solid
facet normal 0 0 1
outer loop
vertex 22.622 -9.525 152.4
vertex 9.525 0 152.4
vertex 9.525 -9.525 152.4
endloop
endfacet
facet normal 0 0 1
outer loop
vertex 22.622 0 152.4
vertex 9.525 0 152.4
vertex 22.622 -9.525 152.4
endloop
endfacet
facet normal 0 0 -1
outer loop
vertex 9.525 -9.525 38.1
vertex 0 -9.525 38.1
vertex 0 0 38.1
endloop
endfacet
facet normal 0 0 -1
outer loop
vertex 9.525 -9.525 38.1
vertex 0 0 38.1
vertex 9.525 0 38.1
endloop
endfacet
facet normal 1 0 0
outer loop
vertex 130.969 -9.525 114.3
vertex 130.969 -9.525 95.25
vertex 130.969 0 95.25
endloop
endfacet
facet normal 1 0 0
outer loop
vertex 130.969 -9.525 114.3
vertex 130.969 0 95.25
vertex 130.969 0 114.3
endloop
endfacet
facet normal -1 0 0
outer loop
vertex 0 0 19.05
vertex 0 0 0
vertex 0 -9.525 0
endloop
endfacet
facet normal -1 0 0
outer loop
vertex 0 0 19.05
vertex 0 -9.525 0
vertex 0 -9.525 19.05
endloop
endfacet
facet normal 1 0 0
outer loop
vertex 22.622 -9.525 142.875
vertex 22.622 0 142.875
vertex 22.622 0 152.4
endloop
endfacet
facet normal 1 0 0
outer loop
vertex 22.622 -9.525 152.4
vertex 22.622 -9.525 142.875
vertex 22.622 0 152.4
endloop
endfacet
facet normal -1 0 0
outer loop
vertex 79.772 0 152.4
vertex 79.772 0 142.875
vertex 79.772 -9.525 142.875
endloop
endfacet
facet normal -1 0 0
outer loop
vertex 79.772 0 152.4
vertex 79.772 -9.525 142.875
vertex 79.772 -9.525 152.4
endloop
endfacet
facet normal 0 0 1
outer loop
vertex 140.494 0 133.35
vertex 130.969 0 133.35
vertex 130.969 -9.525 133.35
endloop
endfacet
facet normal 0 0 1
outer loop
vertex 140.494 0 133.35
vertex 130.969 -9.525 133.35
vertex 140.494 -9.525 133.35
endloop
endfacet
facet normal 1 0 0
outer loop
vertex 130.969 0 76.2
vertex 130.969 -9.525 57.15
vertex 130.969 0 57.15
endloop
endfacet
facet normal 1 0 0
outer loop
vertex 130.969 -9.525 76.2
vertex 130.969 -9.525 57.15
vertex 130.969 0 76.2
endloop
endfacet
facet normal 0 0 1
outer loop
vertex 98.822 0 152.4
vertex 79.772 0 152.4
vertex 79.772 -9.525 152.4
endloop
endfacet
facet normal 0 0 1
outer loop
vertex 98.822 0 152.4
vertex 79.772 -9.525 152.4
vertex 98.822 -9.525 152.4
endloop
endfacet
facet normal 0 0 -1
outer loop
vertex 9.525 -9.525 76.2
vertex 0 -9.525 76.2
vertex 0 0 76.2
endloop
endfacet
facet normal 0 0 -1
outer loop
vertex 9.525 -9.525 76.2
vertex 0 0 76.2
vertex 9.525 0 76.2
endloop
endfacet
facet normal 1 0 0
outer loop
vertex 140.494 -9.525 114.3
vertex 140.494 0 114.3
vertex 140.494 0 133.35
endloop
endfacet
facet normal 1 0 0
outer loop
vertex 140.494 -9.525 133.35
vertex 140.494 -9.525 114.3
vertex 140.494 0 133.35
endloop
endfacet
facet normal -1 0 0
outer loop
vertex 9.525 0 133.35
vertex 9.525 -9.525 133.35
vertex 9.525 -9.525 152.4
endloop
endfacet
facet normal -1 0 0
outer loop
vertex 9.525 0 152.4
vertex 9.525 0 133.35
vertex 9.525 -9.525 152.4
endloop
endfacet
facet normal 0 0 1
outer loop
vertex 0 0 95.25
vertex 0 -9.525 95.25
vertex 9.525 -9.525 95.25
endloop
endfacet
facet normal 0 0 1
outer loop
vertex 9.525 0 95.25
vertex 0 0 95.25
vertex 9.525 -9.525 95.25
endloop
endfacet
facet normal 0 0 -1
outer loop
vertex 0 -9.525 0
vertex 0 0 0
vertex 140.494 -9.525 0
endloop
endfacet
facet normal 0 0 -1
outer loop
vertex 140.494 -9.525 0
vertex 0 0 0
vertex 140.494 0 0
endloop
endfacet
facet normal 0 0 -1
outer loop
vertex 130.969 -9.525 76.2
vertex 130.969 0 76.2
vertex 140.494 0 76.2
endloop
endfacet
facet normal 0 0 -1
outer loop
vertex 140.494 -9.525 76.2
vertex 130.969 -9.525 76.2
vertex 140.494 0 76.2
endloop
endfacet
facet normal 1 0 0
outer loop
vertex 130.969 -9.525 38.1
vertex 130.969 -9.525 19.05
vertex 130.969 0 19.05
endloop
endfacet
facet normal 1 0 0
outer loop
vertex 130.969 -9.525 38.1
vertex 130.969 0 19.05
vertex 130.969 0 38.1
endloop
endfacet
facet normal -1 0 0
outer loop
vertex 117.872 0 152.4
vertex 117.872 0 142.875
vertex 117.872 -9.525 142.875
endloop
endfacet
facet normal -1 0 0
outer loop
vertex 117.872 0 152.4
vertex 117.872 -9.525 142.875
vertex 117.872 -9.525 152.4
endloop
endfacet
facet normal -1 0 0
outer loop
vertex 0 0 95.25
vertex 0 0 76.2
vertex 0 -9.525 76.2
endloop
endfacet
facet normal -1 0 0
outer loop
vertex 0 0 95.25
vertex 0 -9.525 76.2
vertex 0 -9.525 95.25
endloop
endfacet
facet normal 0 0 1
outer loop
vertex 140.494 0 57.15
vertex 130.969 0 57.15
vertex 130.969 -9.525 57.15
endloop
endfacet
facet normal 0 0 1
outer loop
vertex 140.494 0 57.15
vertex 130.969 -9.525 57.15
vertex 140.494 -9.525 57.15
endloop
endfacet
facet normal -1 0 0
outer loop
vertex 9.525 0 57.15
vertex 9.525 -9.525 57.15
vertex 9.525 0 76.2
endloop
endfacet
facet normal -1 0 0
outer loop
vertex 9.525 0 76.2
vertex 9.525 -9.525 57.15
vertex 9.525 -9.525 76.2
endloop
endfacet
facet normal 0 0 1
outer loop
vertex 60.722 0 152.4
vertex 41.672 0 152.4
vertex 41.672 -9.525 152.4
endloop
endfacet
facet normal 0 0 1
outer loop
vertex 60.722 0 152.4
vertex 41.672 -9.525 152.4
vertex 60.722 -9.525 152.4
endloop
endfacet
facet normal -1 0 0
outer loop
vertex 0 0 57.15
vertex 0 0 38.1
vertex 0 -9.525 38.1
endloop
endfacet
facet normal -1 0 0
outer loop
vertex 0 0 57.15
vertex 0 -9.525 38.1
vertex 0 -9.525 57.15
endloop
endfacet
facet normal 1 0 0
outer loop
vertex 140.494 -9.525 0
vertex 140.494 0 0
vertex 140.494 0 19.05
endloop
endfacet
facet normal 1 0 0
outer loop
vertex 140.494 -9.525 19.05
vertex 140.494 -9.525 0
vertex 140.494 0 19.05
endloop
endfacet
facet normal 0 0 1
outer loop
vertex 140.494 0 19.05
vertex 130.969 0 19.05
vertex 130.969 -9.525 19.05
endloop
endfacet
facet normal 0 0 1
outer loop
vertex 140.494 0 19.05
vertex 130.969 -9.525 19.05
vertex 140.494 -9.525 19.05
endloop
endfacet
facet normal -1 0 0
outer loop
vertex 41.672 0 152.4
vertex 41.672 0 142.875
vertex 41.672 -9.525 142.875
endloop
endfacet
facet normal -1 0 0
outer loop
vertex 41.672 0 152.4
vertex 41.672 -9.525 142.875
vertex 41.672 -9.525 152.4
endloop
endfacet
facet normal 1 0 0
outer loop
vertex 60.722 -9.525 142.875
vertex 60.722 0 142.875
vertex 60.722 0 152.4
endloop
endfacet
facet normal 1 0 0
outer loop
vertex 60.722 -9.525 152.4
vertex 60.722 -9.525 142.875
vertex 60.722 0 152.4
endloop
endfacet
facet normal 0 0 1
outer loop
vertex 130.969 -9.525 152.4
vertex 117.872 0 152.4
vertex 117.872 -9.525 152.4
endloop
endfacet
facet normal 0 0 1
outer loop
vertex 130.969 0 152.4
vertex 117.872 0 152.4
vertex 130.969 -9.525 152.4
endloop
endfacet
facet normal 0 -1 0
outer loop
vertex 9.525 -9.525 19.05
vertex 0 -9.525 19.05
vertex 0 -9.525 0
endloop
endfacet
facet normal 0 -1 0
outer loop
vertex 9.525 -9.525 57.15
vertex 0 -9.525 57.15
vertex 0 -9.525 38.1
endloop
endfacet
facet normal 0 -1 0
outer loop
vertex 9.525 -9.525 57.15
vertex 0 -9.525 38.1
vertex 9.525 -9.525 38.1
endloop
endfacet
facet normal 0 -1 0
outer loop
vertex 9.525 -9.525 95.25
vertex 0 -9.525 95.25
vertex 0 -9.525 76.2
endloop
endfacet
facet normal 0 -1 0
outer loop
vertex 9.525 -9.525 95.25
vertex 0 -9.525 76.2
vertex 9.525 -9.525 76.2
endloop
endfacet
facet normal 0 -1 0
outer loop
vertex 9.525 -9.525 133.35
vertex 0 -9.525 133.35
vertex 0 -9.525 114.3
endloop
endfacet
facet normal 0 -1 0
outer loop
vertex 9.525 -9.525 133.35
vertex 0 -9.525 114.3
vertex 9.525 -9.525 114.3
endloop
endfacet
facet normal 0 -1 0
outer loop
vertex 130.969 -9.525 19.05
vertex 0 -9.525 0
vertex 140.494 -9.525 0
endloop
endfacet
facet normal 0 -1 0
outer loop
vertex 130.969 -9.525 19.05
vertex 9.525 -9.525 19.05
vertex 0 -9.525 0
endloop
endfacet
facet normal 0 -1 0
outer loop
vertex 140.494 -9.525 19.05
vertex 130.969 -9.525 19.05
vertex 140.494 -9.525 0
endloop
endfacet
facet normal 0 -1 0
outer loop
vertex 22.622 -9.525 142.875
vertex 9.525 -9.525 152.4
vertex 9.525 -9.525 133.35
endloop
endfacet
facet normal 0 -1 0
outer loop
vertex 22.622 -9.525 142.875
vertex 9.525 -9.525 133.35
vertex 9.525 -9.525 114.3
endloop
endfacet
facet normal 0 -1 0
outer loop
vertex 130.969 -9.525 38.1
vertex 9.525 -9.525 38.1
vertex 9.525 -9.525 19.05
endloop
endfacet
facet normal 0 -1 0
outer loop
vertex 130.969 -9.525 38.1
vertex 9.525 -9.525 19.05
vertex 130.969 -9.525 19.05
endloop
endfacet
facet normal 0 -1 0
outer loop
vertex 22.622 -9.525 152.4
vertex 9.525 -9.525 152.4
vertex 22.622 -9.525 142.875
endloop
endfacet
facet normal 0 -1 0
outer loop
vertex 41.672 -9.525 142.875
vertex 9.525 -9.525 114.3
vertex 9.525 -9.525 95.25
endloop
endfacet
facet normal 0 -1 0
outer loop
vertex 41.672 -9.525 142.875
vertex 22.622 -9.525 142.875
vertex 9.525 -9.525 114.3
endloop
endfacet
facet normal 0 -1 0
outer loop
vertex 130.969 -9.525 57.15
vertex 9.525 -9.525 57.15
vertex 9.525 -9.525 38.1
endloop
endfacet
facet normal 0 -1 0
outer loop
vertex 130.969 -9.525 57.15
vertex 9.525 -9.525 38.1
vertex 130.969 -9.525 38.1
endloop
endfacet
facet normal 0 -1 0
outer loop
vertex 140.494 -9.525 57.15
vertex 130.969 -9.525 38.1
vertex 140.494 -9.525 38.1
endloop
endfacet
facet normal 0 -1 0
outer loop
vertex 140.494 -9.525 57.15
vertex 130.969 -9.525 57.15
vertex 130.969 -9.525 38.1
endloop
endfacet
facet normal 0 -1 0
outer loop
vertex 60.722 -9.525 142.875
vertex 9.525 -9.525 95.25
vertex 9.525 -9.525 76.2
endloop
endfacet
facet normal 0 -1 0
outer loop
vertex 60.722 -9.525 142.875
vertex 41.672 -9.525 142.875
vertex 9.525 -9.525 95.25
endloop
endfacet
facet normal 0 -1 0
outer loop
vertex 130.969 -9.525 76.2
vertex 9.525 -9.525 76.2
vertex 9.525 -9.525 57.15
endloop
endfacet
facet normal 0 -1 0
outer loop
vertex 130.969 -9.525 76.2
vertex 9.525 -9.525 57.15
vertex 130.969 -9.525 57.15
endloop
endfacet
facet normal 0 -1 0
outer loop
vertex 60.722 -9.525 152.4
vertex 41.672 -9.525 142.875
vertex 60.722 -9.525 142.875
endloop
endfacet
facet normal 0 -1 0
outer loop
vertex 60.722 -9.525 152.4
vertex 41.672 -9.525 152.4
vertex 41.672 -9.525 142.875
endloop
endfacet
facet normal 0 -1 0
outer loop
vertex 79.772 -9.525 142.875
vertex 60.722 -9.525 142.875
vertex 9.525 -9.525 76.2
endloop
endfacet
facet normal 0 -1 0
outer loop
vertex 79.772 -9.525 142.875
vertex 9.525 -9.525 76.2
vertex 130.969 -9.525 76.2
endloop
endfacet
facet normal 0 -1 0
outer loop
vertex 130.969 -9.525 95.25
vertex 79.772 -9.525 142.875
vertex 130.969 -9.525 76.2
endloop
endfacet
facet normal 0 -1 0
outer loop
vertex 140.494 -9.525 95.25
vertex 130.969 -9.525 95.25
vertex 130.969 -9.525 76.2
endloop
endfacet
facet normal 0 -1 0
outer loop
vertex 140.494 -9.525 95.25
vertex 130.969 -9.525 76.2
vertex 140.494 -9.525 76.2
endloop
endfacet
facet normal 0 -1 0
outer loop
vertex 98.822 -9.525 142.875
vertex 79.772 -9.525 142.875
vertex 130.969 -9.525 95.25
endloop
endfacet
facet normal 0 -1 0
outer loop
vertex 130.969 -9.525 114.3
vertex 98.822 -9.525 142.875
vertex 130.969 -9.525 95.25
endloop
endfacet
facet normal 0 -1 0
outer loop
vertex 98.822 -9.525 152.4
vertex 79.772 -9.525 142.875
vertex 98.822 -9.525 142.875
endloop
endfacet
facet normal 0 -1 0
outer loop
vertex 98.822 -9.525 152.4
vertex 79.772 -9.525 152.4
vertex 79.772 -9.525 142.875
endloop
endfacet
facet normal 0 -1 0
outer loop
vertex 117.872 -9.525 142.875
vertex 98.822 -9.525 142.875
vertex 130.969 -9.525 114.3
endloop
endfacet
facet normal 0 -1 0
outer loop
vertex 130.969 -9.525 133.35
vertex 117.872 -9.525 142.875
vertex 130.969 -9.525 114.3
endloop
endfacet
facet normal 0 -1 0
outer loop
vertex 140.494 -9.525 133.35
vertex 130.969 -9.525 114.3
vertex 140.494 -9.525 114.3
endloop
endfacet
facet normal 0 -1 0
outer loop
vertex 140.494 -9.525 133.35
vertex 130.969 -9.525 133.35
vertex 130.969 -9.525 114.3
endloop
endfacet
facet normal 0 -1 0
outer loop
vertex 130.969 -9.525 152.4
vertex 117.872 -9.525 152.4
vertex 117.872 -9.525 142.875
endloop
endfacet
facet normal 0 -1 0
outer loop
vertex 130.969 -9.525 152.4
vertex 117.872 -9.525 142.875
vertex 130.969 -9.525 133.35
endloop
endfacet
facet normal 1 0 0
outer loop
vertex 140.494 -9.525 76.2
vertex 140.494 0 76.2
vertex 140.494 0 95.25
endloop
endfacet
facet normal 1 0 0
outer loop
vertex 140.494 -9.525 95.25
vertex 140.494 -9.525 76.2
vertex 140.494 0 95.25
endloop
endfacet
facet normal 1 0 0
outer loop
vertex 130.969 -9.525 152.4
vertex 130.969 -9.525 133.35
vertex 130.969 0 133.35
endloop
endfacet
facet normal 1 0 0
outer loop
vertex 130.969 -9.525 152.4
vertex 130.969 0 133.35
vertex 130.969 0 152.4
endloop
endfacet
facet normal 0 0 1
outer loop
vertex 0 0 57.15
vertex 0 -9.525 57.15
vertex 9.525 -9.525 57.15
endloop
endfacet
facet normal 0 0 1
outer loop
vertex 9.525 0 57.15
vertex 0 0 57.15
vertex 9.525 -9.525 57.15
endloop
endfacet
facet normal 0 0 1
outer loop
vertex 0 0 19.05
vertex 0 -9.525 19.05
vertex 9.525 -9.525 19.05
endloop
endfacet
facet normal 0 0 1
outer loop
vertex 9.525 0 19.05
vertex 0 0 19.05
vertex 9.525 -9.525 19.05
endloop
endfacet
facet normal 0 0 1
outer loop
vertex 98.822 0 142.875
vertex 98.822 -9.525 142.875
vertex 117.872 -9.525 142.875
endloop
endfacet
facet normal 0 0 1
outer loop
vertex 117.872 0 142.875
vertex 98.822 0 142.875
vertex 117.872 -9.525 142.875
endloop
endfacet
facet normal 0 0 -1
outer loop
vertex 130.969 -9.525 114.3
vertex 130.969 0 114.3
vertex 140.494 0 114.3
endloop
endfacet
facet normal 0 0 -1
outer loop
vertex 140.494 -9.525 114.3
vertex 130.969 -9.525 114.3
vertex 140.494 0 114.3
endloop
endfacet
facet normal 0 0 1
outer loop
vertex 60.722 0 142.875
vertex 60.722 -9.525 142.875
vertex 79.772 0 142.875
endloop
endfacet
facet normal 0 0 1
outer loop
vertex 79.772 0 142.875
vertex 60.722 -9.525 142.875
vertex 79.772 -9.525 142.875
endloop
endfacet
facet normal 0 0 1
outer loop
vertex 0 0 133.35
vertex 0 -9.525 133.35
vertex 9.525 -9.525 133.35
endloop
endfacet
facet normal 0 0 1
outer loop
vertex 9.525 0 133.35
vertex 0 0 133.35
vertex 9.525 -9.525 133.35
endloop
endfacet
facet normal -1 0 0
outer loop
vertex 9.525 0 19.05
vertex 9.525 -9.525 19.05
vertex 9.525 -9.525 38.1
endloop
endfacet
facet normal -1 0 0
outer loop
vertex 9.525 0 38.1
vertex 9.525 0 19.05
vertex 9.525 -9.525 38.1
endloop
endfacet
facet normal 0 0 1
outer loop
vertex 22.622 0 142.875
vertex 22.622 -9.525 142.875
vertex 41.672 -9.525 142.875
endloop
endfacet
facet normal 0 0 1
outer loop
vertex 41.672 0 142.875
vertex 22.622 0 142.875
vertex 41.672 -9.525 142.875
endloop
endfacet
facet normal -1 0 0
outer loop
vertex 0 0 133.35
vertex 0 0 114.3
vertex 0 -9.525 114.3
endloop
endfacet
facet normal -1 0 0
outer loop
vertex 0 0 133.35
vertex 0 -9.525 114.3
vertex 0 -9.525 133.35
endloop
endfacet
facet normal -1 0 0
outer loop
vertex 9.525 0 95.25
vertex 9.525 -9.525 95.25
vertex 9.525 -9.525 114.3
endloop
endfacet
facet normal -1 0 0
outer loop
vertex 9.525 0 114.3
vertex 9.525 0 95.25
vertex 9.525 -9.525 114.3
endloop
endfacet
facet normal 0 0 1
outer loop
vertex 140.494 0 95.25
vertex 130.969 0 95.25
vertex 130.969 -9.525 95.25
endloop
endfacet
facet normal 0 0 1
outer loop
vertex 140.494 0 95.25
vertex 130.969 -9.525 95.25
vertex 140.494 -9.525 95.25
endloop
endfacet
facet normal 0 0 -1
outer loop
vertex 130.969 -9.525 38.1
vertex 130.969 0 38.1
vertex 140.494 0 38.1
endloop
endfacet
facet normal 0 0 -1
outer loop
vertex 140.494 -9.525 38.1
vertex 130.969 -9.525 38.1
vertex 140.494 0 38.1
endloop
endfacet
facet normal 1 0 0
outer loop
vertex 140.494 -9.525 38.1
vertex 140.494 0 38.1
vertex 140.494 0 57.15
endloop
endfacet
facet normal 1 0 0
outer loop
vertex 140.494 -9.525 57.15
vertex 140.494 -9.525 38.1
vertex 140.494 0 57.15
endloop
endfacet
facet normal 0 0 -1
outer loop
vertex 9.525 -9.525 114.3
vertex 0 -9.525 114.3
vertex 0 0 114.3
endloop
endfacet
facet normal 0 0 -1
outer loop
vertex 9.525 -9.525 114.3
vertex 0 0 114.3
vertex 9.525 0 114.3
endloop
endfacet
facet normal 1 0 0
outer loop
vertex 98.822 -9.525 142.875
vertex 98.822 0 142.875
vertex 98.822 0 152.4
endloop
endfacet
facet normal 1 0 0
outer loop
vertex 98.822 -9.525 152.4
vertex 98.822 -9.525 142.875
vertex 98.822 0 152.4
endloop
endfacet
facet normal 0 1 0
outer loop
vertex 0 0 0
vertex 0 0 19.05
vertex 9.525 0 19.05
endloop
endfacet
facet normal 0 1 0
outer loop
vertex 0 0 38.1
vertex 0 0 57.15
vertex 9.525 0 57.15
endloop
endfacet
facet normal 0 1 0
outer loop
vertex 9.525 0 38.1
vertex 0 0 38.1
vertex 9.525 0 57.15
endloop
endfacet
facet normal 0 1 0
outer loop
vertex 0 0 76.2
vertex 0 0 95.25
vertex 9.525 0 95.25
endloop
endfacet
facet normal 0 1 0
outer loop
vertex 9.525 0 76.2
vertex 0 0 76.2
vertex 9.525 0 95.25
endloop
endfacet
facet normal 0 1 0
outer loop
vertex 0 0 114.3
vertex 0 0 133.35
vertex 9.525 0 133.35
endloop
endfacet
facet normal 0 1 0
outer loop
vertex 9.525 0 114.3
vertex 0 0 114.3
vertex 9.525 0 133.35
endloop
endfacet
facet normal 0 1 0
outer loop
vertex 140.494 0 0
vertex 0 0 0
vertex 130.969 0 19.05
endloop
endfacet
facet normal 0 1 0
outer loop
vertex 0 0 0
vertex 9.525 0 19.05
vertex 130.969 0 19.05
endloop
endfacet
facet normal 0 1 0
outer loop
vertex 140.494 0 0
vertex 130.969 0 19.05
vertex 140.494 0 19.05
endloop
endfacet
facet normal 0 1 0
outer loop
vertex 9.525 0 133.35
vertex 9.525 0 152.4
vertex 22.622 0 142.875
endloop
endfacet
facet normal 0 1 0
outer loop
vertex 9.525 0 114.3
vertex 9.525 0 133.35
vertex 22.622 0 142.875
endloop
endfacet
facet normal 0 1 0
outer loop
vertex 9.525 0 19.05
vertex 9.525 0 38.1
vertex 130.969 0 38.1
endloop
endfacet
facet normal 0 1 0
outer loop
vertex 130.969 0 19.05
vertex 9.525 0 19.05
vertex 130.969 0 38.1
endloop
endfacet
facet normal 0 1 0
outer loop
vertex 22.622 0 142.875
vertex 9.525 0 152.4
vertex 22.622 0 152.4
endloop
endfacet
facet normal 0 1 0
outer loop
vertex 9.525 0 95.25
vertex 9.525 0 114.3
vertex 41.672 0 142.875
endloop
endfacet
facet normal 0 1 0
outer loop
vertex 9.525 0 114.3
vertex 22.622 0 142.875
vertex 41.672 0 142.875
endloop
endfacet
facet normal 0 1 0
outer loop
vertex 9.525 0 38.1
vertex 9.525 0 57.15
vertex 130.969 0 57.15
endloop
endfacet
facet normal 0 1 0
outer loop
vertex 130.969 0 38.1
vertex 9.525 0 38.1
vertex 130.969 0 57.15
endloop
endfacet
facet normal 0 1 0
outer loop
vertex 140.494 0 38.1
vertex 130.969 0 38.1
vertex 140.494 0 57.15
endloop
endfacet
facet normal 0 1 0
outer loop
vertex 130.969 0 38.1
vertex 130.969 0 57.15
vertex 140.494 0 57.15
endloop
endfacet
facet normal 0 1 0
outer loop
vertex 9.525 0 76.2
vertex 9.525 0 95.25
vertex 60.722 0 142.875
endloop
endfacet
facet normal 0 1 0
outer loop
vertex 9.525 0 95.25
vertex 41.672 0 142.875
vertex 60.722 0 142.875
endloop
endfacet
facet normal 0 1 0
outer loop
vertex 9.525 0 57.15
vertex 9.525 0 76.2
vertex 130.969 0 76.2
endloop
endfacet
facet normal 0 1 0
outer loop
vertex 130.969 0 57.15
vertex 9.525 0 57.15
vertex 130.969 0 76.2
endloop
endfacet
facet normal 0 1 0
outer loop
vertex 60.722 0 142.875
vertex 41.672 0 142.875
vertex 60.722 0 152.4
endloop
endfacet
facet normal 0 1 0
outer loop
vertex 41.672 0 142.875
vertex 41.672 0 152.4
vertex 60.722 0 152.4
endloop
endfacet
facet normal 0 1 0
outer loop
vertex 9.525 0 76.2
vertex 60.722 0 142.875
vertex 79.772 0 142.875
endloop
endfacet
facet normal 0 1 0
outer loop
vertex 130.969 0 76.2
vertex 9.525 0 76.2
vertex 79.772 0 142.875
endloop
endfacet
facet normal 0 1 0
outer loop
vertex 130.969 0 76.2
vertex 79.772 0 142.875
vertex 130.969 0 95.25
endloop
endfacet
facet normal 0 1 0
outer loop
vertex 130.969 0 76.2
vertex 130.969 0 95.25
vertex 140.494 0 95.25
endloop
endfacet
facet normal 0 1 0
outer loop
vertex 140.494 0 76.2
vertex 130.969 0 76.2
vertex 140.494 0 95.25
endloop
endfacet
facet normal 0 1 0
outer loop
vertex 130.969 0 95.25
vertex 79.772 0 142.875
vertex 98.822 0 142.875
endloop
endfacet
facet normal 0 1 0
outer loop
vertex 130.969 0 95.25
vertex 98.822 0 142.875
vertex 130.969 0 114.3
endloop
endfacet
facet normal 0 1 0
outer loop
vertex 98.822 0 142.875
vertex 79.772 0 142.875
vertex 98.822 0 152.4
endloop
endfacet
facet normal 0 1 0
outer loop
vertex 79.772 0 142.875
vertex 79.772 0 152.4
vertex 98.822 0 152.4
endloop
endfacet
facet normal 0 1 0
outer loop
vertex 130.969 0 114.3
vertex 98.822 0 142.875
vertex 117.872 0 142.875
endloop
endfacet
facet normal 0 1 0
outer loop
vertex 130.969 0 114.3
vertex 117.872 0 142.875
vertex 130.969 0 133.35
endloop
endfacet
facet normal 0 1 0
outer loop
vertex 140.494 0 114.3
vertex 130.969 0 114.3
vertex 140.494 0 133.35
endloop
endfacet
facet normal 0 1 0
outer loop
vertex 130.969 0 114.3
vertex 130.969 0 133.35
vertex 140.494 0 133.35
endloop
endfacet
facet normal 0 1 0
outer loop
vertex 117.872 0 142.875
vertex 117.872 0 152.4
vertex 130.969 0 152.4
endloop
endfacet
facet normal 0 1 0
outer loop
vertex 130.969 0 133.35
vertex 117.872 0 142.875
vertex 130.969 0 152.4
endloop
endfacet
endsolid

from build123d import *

# Parameters (mm, degrees)
F0_W     = 140.49375
F0_H     = 152.4
F1_DEPTH = 9.525
F2_W     = 9.525
F2_H     = 19.05
F2_W_2   = 19.05
F2_H_2   = 9.525
F3_DEPTH = 25.4


with BuildPart() as f1:
    # F0 (on Front) → F1 (new body)
    with BuildSketch(Plane.XZ):
        with Locations((70.246875, 76.2)):
            Rectangle(F0_W, F0_H)
    extrude(amount=F1_DEPTH)

    # F2 (on face) → F3 (cut)
    with BuildSketch(Plane.XZ.offset(9.525)):
        with Locations((4.7625, 142.875)):
            Rectangle(F2_W, F2_H)
        with Locations((4.7625, 104.775)):
            Rectangle(F2_W, F2_H)
        with Locations((4.7625, 66.675)):
            Rectangle(F2_W, F2_H)
        with Locations((4.7625, 28.575)):
            Rectangle(F2_W, F2_H)
        with Locations((32.146875, 147.6375)):
            Rectangle(F2_W_2, F2_H_2)
        with Locations((70.246875, 147.6375)):
            Rectangle(F2_W_2, F2_H_2)
        with Locations((108.346875, 147.6375)):
            Rectangle(F2_W_2, F2_H_2)
        with Locations((135.73125, 142.875)):
            Rectangle(F2_W, F2_H)
        with Locations((135.73125, 104.775)):
            Rectangle(F2_W, F2_H)
        with Locations((135.73125, 66.675)):
            Rectangle(F2_W, F2_H)
        with Locations((135.73125, 28.575)):
            Rectangle(F2_W, F2_H)
    extrude(amount=-F3_DEPTH, mode=Mode.SUBTRACT)


solid = f1.part
